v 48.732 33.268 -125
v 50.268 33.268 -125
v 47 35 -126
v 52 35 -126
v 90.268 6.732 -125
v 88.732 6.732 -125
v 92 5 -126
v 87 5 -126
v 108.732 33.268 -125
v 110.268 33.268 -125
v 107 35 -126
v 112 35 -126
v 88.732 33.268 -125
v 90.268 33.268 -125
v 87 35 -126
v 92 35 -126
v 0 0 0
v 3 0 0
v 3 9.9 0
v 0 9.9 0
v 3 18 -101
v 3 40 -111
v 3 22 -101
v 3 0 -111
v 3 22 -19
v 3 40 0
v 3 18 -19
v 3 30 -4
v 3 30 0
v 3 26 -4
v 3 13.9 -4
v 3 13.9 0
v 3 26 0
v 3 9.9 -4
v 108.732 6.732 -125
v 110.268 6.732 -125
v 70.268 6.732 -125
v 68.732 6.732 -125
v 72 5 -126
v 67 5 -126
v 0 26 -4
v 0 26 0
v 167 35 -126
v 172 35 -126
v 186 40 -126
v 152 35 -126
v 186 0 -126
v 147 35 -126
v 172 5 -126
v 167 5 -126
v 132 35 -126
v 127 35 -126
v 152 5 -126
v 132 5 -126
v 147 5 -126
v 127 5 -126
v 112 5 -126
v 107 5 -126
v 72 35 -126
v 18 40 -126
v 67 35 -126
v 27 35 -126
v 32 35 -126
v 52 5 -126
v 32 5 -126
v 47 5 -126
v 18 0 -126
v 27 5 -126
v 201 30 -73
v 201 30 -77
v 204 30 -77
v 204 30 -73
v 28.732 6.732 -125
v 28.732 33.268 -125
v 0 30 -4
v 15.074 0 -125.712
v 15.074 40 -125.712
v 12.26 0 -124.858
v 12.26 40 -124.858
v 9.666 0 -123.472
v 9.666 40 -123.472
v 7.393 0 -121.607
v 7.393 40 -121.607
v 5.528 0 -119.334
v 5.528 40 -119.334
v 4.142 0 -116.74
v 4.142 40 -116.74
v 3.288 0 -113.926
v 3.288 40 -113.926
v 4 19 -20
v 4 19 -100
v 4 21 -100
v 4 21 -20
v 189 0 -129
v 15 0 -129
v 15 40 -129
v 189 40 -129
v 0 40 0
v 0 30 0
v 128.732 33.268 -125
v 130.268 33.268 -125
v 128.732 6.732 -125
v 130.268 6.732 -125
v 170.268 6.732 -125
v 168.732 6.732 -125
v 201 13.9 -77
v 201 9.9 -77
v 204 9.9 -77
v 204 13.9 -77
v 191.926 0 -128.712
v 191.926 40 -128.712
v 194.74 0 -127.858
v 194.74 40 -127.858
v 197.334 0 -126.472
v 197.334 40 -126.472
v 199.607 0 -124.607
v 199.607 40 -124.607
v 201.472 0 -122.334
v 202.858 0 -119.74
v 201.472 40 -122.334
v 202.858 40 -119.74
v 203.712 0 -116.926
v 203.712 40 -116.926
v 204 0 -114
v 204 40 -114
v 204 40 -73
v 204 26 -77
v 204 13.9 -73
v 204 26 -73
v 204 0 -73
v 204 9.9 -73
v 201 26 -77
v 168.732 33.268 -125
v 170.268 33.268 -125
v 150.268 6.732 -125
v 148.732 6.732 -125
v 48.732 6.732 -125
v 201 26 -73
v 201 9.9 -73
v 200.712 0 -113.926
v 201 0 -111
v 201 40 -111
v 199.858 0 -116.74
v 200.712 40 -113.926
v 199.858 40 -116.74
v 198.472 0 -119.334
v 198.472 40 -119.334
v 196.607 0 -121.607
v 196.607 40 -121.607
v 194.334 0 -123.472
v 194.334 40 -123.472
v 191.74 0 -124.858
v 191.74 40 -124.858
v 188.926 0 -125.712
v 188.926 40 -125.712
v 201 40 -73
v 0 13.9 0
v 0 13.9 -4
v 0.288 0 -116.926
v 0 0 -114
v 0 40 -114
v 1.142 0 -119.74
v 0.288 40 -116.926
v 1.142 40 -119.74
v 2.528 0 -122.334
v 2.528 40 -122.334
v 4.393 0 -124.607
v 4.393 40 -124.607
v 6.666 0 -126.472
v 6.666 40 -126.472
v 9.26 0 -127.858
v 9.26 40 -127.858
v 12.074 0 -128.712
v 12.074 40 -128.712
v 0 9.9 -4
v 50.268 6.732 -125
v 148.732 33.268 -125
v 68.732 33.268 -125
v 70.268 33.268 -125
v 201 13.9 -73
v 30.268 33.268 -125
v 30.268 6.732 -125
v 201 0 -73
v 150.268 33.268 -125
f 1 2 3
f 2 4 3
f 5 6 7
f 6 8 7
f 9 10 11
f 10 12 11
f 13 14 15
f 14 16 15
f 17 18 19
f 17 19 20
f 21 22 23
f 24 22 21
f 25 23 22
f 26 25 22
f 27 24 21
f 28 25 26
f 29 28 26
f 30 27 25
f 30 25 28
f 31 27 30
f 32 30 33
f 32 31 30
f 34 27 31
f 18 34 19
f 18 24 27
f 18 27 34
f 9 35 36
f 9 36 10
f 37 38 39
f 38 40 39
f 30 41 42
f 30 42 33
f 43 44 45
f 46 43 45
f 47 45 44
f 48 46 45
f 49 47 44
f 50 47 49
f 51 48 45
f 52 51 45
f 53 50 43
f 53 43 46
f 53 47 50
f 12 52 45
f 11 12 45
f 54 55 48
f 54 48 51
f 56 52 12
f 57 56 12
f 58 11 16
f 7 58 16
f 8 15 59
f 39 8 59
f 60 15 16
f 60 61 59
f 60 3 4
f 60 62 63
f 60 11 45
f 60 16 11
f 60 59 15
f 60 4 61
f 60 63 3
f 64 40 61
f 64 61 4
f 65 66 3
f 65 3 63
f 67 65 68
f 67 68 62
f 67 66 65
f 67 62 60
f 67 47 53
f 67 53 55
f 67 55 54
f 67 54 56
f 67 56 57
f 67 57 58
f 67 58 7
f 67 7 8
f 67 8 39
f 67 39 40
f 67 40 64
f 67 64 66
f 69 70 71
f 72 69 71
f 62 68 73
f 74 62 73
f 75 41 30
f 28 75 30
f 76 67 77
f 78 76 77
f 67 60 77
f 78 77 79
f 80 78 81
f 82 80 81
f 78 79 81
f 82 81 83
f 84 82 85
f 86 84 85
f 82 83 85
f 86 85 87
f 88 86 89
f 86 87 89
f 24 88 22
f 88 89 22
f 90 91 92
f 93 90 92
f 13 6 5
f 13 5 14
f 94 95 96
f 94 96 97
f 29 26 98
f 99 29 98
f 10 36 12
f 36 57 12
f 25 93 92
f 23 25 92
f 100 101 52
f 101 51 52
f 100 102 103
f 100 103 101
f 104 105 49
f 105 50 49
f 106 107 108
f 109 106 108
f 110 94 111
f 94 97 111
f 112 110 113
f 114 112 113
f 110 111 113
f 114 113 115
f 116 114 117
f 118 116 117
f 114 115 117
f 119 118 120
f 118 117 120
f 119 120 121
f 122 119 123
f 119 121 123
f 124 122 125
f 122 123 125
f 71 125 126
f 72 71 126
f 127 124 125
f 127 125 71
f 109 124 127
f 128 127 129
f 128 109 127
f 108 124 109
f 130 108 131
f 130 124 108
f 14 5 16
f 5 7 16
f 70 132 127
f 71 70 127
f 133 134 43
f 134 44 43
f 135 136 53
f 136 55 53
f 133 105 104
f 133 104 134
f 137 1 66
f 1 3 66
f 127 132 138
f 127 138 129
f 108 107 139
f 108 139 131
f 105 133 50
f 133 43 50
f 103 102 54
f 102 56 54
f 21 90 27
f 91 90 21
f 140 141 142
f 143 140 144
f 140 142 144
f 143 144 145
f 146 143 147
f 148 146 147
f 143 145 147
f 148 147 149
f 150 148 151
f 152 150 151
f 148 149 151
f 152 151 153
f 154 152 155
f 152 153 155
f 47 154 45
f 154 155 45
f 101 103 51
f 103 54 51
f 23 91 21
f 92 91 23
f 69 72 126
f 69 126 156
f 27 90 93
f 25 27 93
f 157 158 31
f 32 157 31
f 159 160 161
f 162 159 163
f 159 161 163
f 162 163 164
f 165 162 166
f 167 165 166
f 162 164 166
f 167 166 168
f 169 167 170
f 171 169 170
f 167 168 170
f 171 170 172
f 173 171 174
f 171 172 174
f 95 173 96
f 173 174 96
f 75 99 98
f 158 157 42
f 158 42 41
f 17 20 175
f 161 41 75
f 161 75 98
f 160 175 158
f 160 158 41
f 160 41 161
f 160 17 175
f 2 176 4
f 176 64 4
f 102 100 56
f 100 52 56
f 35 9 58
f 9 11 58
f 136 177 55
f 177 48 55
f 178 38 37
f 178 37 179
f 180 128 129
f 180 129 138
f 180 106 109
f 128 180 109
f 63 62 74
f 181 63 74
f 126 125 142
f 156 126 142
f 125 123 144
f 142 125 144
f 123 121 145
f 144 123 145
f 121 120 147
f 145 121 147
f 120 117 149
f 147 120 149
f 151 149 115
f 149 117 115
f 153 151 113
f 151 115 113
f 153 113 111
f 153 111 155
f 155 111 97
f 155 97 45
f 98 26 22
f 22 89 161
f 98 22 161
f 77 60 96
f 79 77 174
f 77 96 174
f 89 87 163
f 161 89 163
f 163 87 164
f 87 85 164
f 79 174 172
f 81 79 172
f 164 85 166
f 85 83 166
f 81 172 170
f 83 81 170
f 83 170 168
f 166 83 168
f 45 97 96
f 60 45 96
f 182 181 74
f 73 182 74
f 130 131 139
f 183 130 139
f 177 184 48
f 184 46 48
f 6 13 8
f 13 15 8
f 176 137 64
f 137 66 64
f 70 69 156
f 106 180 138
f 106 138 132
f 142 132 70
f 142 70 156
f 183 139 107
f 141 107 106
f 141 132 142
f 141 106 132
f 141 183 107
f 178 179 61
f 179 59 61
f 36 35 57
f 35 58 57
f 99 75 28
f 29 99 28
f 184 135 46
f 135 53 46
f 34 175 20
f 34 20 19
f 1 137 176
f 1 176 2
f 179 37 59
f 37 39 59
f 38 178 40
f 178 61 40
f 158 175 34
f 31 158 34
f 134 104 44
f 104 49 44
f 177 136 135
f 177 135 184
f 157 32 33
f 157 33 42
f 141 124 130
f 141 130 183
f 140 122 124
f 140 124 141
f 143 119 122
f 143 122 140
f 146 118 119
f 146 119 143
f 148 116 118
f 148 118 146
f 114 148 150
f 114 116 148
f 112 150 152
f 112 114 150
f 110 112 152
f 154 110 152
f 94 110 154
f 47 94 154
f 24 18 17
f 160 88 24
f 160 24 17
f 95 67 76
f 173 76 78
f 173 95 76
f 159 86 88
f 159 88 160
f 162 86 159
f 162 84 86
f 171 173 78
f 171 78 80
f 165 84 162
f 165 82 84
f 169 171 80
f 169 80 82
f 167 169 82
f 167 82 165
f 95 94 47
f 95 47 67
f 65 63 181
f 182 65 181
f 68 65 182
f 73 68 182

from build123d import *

# Parameters (mm, degrees)
EXTRUDE_1_DEPTH              = 40
FILLET_1_R                   = 15
SKETCH_2_W                   = 1
SKETCH_2_H                   = 26
EXTRUDE_2_DEPTH              = 1
CHAMFER_1_SIZE               = 2
CHAMFER_1_SIZE_2             = 1.154700538
PATTERN_LINEAR_1_OUTLINE_W   = 1.535898384
PATTERN_LINEAR_1_OUTLINE_H   = 26.535898384
PATTERN_LINEAR_1_DEPTH       = 1
PATTERN_LINEAR_1_TAPER       = -60
PATTERN_LINEAR_1_2_OUTLINE_W = 1.535898384
PATTERN_LINEAR_1_2_OUTLINE_H = 26.535898384
PATTERN_LINEAR_1_2_DEPTH     = 1
PATTERN_LINEAR_1_2_TAPER     = -60
PATTERN_LINEAR_1_3_OUTLINE_W = 1.535898384
PATTERN_LINEAR_1_3_OUTLINE_H = 26.535898384
PATTERN_LINEAR_1_3_DEPTH     = 1
PATTERN_LINEAR_1_3_TAPER     = -60
PATTERN_LINEAR_1_4_OUTLINE_W = 1.535898384
PATTERN_LINEAR_1_4_OUTLINE_H = 26.535898384
PATTERN_LINEAR_1_4_DEPTH     = 1
PATTERN_LINEAR_1_4_TAPER     = -60
PATTERN_LINEAR_1_5_OUTLINE_W = 1.535898384
PATTERN_LINEAR_1_5_OUTLINE_H = 26.535898384
PATTERN_LINEAR_1_5_DEPTH     = 1
PATTERN_LINEAR_1_5_TAPER     = -60
PATTERN_LINEAR_1_6_OUTLINE_W = 1.535898384
PATTERN_LINEAR_1_6_OUTLINE_H = 26.535898384
PATTERN_LINEAR_1_6_DEPTH     = 1
PATTERN_LINEAR_1_6_TAPER     = -60
PATTERN_LINEAR_1_7_OUTLINE_W = 1.535898384
PATTERN_LINEAR_1_7_OUTLINE_H = 26.535898384
PATTERN_LINEAR_1_7_DEPTH     = 1
PATTERN_LINEAR_1_7_TAPER     = -60
SKETCH_4_W                   = 1
SKETCH_4_H                   = 2
EXTRUDE_3_DEPTH              = 100
SKETCH_4_3_W                 = 1
SKETCH_4_3_H                 = 2
CUT_EXTRUDE_1_DEPTH          = 20
CHAMFER_3_SIZE               = 1
OTHER_START                  = 9.9
OTHER_3_OUTLINE_W            = 3
OTHER_3_OUTLINE_H            = 4
OTHER_3_DEPTH                = 4
OTHER_START_2                = 26
OTHER_3_2_OUTLINE_W          = 3
OTHER_3_2_OUTLINE_H          = 4
OTHER_3_2_DEPTH              = 4
OTHER_4_OUTLINE_W            = 3
OTHER_4_OUTLINE_H            = 4
OTHER_4_DEPTH                = 4
OTHER_4_2_OUTLINE_W          = 3
OTHER_4_2_OUTLINE_H          = 4
OTHER_4_2_DEPTH              = 4


# Read off the part's stored shape, not the designer's step: Линейный массив1, Отступ3, Отступ4
# Some blends are built 0.0001 mm under size
with BuildPart() as part:
    # Эскиз1 → Бобышка-Вытянуть1 (new body)
    with BuildSketch(Plane(origin=(0, 0, 0), x_dir=(1, 0, 0), z_dir=(0, 1, 0))):
        Polygon((0, 0), (0, 129), (204, 129), (204, 73), (201, 73), (201, 126), (3, 126), (3, 0), align=None)
    extrude(amount=EXTRUDE_1_DEPTH)

    # Скругление1
    fillet_1_edges = [part.edges().sort_by_distance(p)[0] for p in [
        (0, 20, -129),
        (204, 20, -129),
        (201, 20, -126),
        (3, 20, -126),
    ]]
    fillet(fillet_1_edges, radius=FILLET_1_R)

    # Эскиз2 → Бобышка-Вытянуть2 (add)
    with BuildSketch(Plane.XY.offset(-126)):
        with Locations((29.5, 20)):
            Rectangle(SKETCH_2_W, SKETCH_2_H)
    extrude(amount=EXTRUDE_2_DEPTH)

    # Фаска1
    # the kernel refuses this chamfer: 2, 1.154700538 mm, written as the material it adds along each edge
    with BuildSketch(Plane(origin=(30, 7, -126), x_dir=(0, -0.9998132206222077, -0.019326765612703727), z_dir=(-1, 0, 0))) as chamfer_1_piece_1_section:
        Polygon((CHAMFER_1_SIZE * 0.999813220622, CHAMFER_1_SIZE * 0.0193267656127), (-CHAMFER_1_SIZE_2 * 0.0193267656191, CHAMFER_1_SIZE_2 * 0.999813220951), (0, 0), align=None)
    chamfer_1_piece_1 = extrude(amount=1, mode=Mode.PRIVATE)
    chamfer_1_piece_1 = split(chamfer_1_piece_1, bisect_by=Plane(origin=(29.5, 6.310262321, -125), z_dir=(0, 0, -1)), keep=Keep.TOP, mode=Mode.PRIVATE)
    add(chamfer_1_piece_1)
    with BuildSketch(Plane(origin=(29, 7, -126), x_dir=(-0.9998132206222079, 0, -0.019326765612703557), z_dir=(0, 1, 0))) as chamfer_1_piece_2_section:
        Polygon((CHAMFER_1_SIZE * 0.999813220622, CHAMFER_1_SIZE * 0.0193267656127), (-CHAMFER_1_SIZE_2 * 0.0193267656191, CHAMFER_1_SIZE_2 * 0.999813220951), (0, 0), align=None)
    chamfer_1_piece_2 = extrude(amount=26, mode=Mode.PRIVATE)
    chamfer_1_piece_2 = split(chamfer_1_piece_2, bisect_by=Plane(origin=(28.310262321, 20, -125), z_dir=(0, 0, -1)), keep=Keep.TOP, mode=Mode.PRIVATE)
    add(chamfer_1_piece_2)
    with BuildSketch(Plane(origin=(29, 33, -126), x_dir=(0, 0.9998132206222079, -0.019326765612703755), z_dir=(1, 0, 0))) as chamfer_1_piece_3_section:
        Polygon((CHAMFER_1_SIZE * 0.999813220622, CHAMFER_1_SIZE * 0.0193267656127), (-CHAMFER_1_SIZE_2 * 0.0193267656191, CHAMFER_1_SIZE_2 * 0.999813220951), (0, 0), align=None)
    chamfer_1_piece_3 = extrude(amount=1, mode=Mode.PRIVATE)
    chamfer_1_piece_3 = split(chamfer_1_piece_3, bisect_by=Plane(origin=(29.5, 33.689737679, -125), z_dir=(0, 0, -1)), keep=Keep.TOP, mode=Mode.PRIVATE)
    add(chamfer_1_piece_3)
    with BuildSketch(Plane(origin=(30, 33, -126), x_dir=(0.9998132206222077, 0, -0.019326765612703883), z_dir=(0, -1, 0))) as chamfer_1_piece_4_section:
        Polygon((CHAMFER_1_SIZE * 0.999813220622, CHAMFER_1_SIZE * 0.0193267656127), (-CHAMFER_1_SIZE_2 * 0.0193267656191, CHAMFER_1_SIZE_2 * 0.999813220951), (0, 0), align=None)
    chamfer_1_piece_4 = extrude(amount=26, mode=Mode.PRIVATE)
    chamfer_1_piece_4 = split(chamfer_1_piece_4, bisect_by=Plane(origin=(30.689737679, 20, -125), z_dir=(0, 0, -1)), keep=Keep.TOP, mode=Mode.PRIVATE)
    add(chamfer_1_piece_4)
    with BuildSketch(Plane(origin=(35.174171509, 7, -126), x_dir=(0, -0.9998132206222077, -0.019326765612703727), z_dir=(-1, 0, 0))) as chamfer_1_piece_5a_section:
        Polygon((CHAMFER_1_SIZE * 0.999813220622, CHAMFER_1_SIZE * 0.0193267656127), (-CHAMFER_1_SIZE_2 * 0.0193267656191, CHAMFER_1_SIZE_2 * 0.999813220951), (0, 0), align=None)
    chamfer_1_piece_5a = extrude(amount=6.174171509, mode=Mode.PRIVATE)
    chamfer_1_piece_5a = split(chamfer_1_piece_5a, bisect_by=Plane(origin=(30, 6.310262321, -125.650398981), z_dir=(1, 0, 0)), keep=Keep.TOP, mode=Mode.PRIVATE)
    chamfer_1_piece_5a = split(chamfer_1_piece_5a, bisect_by=Plane(origin=(32.587085755, 6.310262321, -125), z_dir=(0, 0, -1)), keep=Keep.TOP, mode=Mode.PRIVATE)
    with BuildSketch(Plane(origin=(30, 33, -126), x_dir=(0.9998132206222077, 0, -0.019326765612703883), z_dir=(0, -1, 0))) as chamfer_1_piece_5b_section:
        Polygon((CHAMFER_1_SIZE * 0.999813220622, CHAMFER_1_SIZE * 0.0193267656127), (-CHAMFER_1_SIZE_2 * 0.0193267656191, CHAMFER_1_SIZE_2 * 0.999813220951), (0, 0), align=None)
    chamfer_1_piece_5b = extrude(amount=31.174171509, mode=Mode.PRIVATE)
    chamfer_1_piece_5b = split(chamfer_1_piece_5b, bisect_by=Plane(origin=(30.689737679, 7, -125.650398981), z_dir=(0, -1, 0)), keep=Keep.TOP, mode=Mode.PRIVATE)
    chamfer_1_piece_5b = split(chamfer_1_piece_5b, bisect_by=Plane(origin=(30.689737679, 4.412914245, -125), z_dir=(0, 0, -1)), keep=Keep.TOP, mode=Mode.PRIVATE)
    chamfer_1_piece_5 = chamfer_1_piece_5a & chamfer_1_piece_5b
    add(chamfer_1_piece_5)
    with BuildSketch(Plane(origin=(29, 1.825828491, -126), x_dir=(-0.9998132206222077, 0, -0.019326765612703717), z_dir=(0, 1, 0))) as chamfer_1_piece_6a_section:
        Polygon((CHAMFER_1_SIZE * 0.999813220622, CHAMFER_1_SIZE * 0.0193267656127), (-CHAMFER_1_SIZE_2 * 0.019326765619, CHAMFER_1_SIZE_2 * 0.999813220951), (0, 0), align=None)
    chamfer_1_piece_6a = extrude(amount=31.174171509, mode=Mode.PRIVATE)
    chamfer_1_piece_6a = split(chamfer_1_piece_6a, bisect_by=Plane(origin=(28.310262321, 7, -125.650398981), z_dir=(0, -1, 0)), keep=Keep.TOP, mode=Mode.PRIVATE)
    chamfer_1_piece_6a = split(chamfer_1_piece_6a, bisect_by=Plane(origin=(28.310262321, 4.412914245, -125), z_dir=(0, 0, -1)), keep=Keep.TOP, mode=Mode.PRIVATE)
    with BuildSketch(Plane(origin=(30, 7, -126), x_dir=(0, -0.9998132206222077, -0.019326765612703727), z_dir=(-1, 0, 0))) as chamfer_1_piece_6b_section:
        Polygon((CHAMFER_1_SIZE * 0.999813220622, CHAMFER_1_SIZE * 0.0193267656127), (-CHAMFER_1_SIZE_2 * 0.0193267656191, CHAMFER_1_SIZE_2 * 0.999813220951), (0, 0), align=None)
    chamfer_1_piece_6b = extrude(amount=6.174171509, mode=Mode.PRIVATE)
    chamfer_1_piece_6b = split(chamfer_1_piece_6b, bisect_by=Plane(origin=(29, 6.310262321, -125.650398981), z_dir=(-1, 0, 0)), keep=Keep.TOP, mode=Mode.PRIVATE)
    chamfer_1_piece_6b = split(chamfer_1_piece_6b, bisect_by=Plane(origin=(26.412914245, 6.310262321, -125), z_dir=(0, 0, -1)), keep=Keep.TOP, mode=Mode.PRIVATE)
    chamfer_1_piece_6 = chamfer_1_piece_6a & chamfer_1_piece_6b
    add(chamfer_1_piece_6)
    with BuildSketch(Plane(origin=(29, 7, -126), x_dir=(-0.9998132206222079, 0, -0.019326765612703557), z_dir=(0, 1, 0))) as chamfer_1_piece_7a_section:
        Polygon((CHAMFER_1_SIZE * 0.999813220622, CHAMFER_1_SIZE * 0.0193267656127), (-CHAMFER_1_SIZE_2 * 0.0193267656191, CHAMFER_1_SIZE_2 * 0.999813220951), (0, 0), align=None)
    chamfer_1_piece_7a = extrude(amount=31.174171509, mode=Mode.PRIVATE)
    chamfer_1_piece_7a = split(chamfer_1_piece_7a, bisect_by=Plane(origin=(28.310262321, 33, -125.650398981), z_dir=(0, 1, 0)), keep=Keep.TOP, mode=Mode.PRIVATE)
    chamfer_1_piece_7a = split(chamfer_1_piece_7a, bisect_by=Plane(origin=(28.310262321, 35.587085755, -125), z_dir=(0, 0, -1)), keep=Keep.TOP, mode=Mode.PRIVATE)
    with BuildSketch(Plane(origin=(23.825828491, 33, -126), x_dir=(0, 0.9998132206222079, -0.019326765612703755), z_dir=(1, 0, 0))) as chamfer_1_piece_7b_section:
        Polygon((CHAMFER_1_SIZE * 0.999813220622, CHAMFER_1_SIZE * 0.0193267656127), (-CHAMFER_1_SIZE_2 * 0.0193267656191, CHAMFER_1_SIZE_2 * 0.999813220951), (0, 0), align=None)
    chamfer_1_piece_7b = extrude(amount=6.174171509, mode=Mode.PRIVATE)
    chamfer_1_piece_7b = split(chamfer_1_piece_7b, bisect_by=Plane(origin=(29, 33.689737679, -125.650398981), z_dir=(-1, 0, 0)), keep=Keep.TOP, mode=Mode.PRIVATE)
    chamfer_1_piece_7b = split(chamfer_1_piece_7b, bisect_by=Plane(origin=(26.412914245, 33.689737679, -125), z_dir=(0, 0, -1)), keep=Keep.TOP, mode=Mode.PRIVATE)
    chamfer_1_piece_7 = chamfer_1_piece_7a & chamfer_1_piece_7b
    add(chamfer_1_piece_7)
    with BuildSketch(Plane(origin=(30, 38.174171509, -126), x_dir=(0.9998132206222079, 0, -0.019326765612703755), z_dir=(0, -1, 0))) as chamfer_1_piece_8a_section:
        Polygon((CHAMFER_1_SIZE * 0.999813220622, CHAMFER_1_SIZE * 0.0193267656127), (-CHAMFER_1_SIZE_2 * 0.019326765619, CHAMFER_1_SIZE_2 * 0.999813220951), (0, 0), align=None)
    chamfer_1_piece_8a = extrude(amount=31.174171509, mode=Mode.PRIVATE)
    chamfer_1_piece_8a = split(chamfer_1_piece_8a, bisect_by=Plane(origin=(30.689737679, 33, -125.650398981), z_dir=(0, 1, 0)), keep=Keep.TOP, mode=Mode.PRIVATE)
    chamfer_1_piece_8a = split(chamfer_1_piece_8a, bisect_by=Plane(origin=(30.689737679, 35.587085755, -125), z_dir=(0, 0, -1)), keep=Keep.TOP, mode=Mode.PRIVATE)
    with BuildSketch(Plane(origin=(29, 33, -126), x_dir=(0, 0.9998132206222079, -0.019326765612703755), z_dir=(1, 0, 0))) as chamfer_1_piece_8b_section:
        Polygon((CHAMFER_1_SIZE * 0.999813220622, CHAMFER_1_SIZE * 0.0193267656127), (-CHAMFER_1_SIZE_2 * 0.0193267656191, CHAMFER_1_SIZE_2 * 0.999813220951), (0, 0), align=None)
    chamfer_1_piece_8b = extrude(amount=6.174171509, mode=Mode.PRIVATE)
    chamfer_1_piece_8b = split(chamfer_1_piece_8b, bisect_by=Plane(origin=(30, 33.689737679, -125.650398981), z_dir=(1, 0, 0)), keep=Keep.TOP, mode=Mode.PRIVATE)
    chamfer_1_piece_8b = split(chamfer_1_piece_8b, bisect_by=Plane(origin=(32.587085755, 33.689737679, -125), z_dir=(0, 0, -1)), keep=Keep.TOP, mode=Mode.PRIVATE)
    chamfer_1_piece_8 = chamfer_1_piece_8a & chamfer_1_piece_8b
    add(chamfer_1_piece_8)

    # Линейный массив1 outline → Линейный массив1 (add)
    with BuildSketch(Plane.XY.offset(-125)):
        with Locations((169.5, 20)):
            Rectangle(PATTERN_LINEAR_1_OUTLINE_W, PATTERN_LINEAR_1_OUTLINE_H)
    extrude(amount=-PATTERN_LINEAR_1_DEPTH, taper=PATTERN_LINEAR_1_TAPER)

    # Pattern Linear 1 2 outline → Pattern Linear 1 2 (add)
    with BuildSketch(Plane.XY.offset(-125)):
        with Locations((149.5, 20)):
            Rectangle(PATTERN_LINEAR_1_2_OUTLINE_W, PATTERN_LINEAR_1_2_OUTLINE_H)
    extrude(amount=-PATTERN_LINEAR_1_2_DEPTH, taper=PATTERN_LINEAR_1_2_TAPER)

    # Pattern Linear 1 3 outline → Pattern Linear 1 3 (add)
    with BuildSketch(Plane.XY.offset(-125)):
        with Locations((129.5, 20)):
            Rectangle(PATTERN_LINEAR_1_3_OUTLINE_W, PATTERN_LINEAR_1_3_OUTLINE_H)
    extrude(amount=-PATTERN_LINEAR_1_3_DEPTH, taper=PATTERN_LINEAR_1_3_TAPER)

    # Pattern Linear 1 4 outline → Pattern Linear 1 4 (add)
    with BuildSketch(Plane.XY.offset(-125)):
        with Locations((109.5, 20)):
            Rectangle(PATTERN_LINEAR_1_4_OUTLINE_W, PATTERN_LINEAR_1_4_OUTLINE_H)
    extrude(amount=-PATTERN_LINEAR_1_4_DEPTH, taper=PATTERN_LINEAR_1_4_TAPER)

    # Pattern Linear 1 5 outline → Pattern Linear 1 5 (add)
    with BuildSketch(Plane.XY.offset(-125)):
        with Locations((89.5, 20)):
            Rectangle(PATTERN_LINEAR_1_5_OUTLINE_W, PATTERN_LINEAR_1_5_OUTLINE_H)
    extrude(amount=-PATTERN_LINEAR_1_5_DEPTH, taper=PATTERN_LINEAR_1_5_TAPER)

    # Pattern Linear 1 6 outline → Pattern Linear 1 6 (add)
    with BuildSketch(Plane.XY.offset(-125)):
        with Locations((69.5, 20)):
            Rectangle(PATTERN_LINEAR_1_6_OUTLINE_W, PATTERN_LINEAR_1_6_OUTLINE_H)
    extrude(amount=-PATTERN_LINEAR_1_6_DEPTH, taper=PATTERN_LINEAR_1_6_TAPER)

    # Pattern Linear 1 7 outline → Pattern Linear 1 7 (add)
    with BuildSketch(Plane.XY.offset(-125)):
        with Locations((49.5, 20)):
            Rectangle(PATTERN_LINEAR_1_7_OUTLINE_W, PATTERN_LINEAR_1_7_OUTLINE_H)
    extrude(amount=-PATTERN_LINEAR_1_7_DEPTH, taper=PATTERN_LINEAR_1_7_TAPER)

    # Эскиз4 → Бобышка-Вытянуть3 (add)
    with BuildSketch(Plane.XY):
        with Locations((3.5, 20)):
            Rectangle(SKETCH_4_W, SKETCH_4_H)
    extrude(amount=-EXTRUDE_3_DEPTH)

    # Эскиз4<3> → Вырез-Вытянуть1 (cut)
    with BuildSketch(Plane.XY):
        with Locations((3.5, 20)):
            Rectangle(SKETCH_4_3_W, SKETCH_4_3_H)
    extrude(amount=-CUT_EXTRUDE_1_DEPTH, mode=Mode.SUBTRACT)

    # Фаска3
    chamfer_3_edges = [part.edges().sort_by_distance(p)[0] for p in [
        (3, 20, -100),
        (3, 21, -60),
        (3, 20, -20),
        (3, 19, -60),
    ]]
    chamfer(chamfer_3_edges, length=CHAMFER_3_SIZE - 0.0001)  # a hair under: the kernel refuses the full size

    # Отступ3 outline → Отступ3 (cut)
    with BuildSketch(Plane(origin=(0, 0, 0), x_dir=(1, 0, 0), z_dir=(0, 1, 0)).offset(OTHER_START)):
        with Locations((202.5, 75)):
            Rectangle(OTHER_3_OUTLINE_W, OTHER_3_OUTLINE_H)
    extrude(amount=OTHER_3_DEPTH, mode=Mode.SUBTRACT)

    # Other 3 2 outline → Other 3 2 (cut)
    with BuildSketch(Plane(origin=(0, 0, 0), x_dir=(1, 0, 0), z_dir=(0, 1, 0)).offset(OTHER_START_2)):
        with Locations((202.5, 75)):
            Rectangle(OTHER_3_2_OUTLINE_W, OTHER_3_2_OUTLINE_H)
    extrude(amount=OTHER_3_2_DEPTH, mode=Mode.SUBTRACT)

    # Отступ4 outline → Отступ4 (cut)
    with BuildSketch(Plane(origin=(0, 0, 0), x_dir=(1, 0, 0), z_dir=(0, 1, 0)).offset(OTHER_START)):
        with Locations((1.5, 2)):
            Rectangle(OTHER_4_OUTLINE_W, OTHER_4_OUTLINE_H)
    extrude(amount=OTHER_4_DEPTH, mode=Mode.SUBTRACT)

    # Other 4 2 outline → Other 4 2 (cut)
    with BuildSketch(Plane(origin=(0, 0, 0), x_dir=(1, 0, 0), z_dir=(0, 1, 0)).offset(OTHER_START_2)):
        with Locations((1.5, 2)):
            Rectangle(OTHER_4_2_OUTLINE_W, OTHER_4_2_OUTLINE_H)
    extrude(amount=OTHER_4_2_DEPTH, mode=Mode.SUBTRACT)


solid = part.part
